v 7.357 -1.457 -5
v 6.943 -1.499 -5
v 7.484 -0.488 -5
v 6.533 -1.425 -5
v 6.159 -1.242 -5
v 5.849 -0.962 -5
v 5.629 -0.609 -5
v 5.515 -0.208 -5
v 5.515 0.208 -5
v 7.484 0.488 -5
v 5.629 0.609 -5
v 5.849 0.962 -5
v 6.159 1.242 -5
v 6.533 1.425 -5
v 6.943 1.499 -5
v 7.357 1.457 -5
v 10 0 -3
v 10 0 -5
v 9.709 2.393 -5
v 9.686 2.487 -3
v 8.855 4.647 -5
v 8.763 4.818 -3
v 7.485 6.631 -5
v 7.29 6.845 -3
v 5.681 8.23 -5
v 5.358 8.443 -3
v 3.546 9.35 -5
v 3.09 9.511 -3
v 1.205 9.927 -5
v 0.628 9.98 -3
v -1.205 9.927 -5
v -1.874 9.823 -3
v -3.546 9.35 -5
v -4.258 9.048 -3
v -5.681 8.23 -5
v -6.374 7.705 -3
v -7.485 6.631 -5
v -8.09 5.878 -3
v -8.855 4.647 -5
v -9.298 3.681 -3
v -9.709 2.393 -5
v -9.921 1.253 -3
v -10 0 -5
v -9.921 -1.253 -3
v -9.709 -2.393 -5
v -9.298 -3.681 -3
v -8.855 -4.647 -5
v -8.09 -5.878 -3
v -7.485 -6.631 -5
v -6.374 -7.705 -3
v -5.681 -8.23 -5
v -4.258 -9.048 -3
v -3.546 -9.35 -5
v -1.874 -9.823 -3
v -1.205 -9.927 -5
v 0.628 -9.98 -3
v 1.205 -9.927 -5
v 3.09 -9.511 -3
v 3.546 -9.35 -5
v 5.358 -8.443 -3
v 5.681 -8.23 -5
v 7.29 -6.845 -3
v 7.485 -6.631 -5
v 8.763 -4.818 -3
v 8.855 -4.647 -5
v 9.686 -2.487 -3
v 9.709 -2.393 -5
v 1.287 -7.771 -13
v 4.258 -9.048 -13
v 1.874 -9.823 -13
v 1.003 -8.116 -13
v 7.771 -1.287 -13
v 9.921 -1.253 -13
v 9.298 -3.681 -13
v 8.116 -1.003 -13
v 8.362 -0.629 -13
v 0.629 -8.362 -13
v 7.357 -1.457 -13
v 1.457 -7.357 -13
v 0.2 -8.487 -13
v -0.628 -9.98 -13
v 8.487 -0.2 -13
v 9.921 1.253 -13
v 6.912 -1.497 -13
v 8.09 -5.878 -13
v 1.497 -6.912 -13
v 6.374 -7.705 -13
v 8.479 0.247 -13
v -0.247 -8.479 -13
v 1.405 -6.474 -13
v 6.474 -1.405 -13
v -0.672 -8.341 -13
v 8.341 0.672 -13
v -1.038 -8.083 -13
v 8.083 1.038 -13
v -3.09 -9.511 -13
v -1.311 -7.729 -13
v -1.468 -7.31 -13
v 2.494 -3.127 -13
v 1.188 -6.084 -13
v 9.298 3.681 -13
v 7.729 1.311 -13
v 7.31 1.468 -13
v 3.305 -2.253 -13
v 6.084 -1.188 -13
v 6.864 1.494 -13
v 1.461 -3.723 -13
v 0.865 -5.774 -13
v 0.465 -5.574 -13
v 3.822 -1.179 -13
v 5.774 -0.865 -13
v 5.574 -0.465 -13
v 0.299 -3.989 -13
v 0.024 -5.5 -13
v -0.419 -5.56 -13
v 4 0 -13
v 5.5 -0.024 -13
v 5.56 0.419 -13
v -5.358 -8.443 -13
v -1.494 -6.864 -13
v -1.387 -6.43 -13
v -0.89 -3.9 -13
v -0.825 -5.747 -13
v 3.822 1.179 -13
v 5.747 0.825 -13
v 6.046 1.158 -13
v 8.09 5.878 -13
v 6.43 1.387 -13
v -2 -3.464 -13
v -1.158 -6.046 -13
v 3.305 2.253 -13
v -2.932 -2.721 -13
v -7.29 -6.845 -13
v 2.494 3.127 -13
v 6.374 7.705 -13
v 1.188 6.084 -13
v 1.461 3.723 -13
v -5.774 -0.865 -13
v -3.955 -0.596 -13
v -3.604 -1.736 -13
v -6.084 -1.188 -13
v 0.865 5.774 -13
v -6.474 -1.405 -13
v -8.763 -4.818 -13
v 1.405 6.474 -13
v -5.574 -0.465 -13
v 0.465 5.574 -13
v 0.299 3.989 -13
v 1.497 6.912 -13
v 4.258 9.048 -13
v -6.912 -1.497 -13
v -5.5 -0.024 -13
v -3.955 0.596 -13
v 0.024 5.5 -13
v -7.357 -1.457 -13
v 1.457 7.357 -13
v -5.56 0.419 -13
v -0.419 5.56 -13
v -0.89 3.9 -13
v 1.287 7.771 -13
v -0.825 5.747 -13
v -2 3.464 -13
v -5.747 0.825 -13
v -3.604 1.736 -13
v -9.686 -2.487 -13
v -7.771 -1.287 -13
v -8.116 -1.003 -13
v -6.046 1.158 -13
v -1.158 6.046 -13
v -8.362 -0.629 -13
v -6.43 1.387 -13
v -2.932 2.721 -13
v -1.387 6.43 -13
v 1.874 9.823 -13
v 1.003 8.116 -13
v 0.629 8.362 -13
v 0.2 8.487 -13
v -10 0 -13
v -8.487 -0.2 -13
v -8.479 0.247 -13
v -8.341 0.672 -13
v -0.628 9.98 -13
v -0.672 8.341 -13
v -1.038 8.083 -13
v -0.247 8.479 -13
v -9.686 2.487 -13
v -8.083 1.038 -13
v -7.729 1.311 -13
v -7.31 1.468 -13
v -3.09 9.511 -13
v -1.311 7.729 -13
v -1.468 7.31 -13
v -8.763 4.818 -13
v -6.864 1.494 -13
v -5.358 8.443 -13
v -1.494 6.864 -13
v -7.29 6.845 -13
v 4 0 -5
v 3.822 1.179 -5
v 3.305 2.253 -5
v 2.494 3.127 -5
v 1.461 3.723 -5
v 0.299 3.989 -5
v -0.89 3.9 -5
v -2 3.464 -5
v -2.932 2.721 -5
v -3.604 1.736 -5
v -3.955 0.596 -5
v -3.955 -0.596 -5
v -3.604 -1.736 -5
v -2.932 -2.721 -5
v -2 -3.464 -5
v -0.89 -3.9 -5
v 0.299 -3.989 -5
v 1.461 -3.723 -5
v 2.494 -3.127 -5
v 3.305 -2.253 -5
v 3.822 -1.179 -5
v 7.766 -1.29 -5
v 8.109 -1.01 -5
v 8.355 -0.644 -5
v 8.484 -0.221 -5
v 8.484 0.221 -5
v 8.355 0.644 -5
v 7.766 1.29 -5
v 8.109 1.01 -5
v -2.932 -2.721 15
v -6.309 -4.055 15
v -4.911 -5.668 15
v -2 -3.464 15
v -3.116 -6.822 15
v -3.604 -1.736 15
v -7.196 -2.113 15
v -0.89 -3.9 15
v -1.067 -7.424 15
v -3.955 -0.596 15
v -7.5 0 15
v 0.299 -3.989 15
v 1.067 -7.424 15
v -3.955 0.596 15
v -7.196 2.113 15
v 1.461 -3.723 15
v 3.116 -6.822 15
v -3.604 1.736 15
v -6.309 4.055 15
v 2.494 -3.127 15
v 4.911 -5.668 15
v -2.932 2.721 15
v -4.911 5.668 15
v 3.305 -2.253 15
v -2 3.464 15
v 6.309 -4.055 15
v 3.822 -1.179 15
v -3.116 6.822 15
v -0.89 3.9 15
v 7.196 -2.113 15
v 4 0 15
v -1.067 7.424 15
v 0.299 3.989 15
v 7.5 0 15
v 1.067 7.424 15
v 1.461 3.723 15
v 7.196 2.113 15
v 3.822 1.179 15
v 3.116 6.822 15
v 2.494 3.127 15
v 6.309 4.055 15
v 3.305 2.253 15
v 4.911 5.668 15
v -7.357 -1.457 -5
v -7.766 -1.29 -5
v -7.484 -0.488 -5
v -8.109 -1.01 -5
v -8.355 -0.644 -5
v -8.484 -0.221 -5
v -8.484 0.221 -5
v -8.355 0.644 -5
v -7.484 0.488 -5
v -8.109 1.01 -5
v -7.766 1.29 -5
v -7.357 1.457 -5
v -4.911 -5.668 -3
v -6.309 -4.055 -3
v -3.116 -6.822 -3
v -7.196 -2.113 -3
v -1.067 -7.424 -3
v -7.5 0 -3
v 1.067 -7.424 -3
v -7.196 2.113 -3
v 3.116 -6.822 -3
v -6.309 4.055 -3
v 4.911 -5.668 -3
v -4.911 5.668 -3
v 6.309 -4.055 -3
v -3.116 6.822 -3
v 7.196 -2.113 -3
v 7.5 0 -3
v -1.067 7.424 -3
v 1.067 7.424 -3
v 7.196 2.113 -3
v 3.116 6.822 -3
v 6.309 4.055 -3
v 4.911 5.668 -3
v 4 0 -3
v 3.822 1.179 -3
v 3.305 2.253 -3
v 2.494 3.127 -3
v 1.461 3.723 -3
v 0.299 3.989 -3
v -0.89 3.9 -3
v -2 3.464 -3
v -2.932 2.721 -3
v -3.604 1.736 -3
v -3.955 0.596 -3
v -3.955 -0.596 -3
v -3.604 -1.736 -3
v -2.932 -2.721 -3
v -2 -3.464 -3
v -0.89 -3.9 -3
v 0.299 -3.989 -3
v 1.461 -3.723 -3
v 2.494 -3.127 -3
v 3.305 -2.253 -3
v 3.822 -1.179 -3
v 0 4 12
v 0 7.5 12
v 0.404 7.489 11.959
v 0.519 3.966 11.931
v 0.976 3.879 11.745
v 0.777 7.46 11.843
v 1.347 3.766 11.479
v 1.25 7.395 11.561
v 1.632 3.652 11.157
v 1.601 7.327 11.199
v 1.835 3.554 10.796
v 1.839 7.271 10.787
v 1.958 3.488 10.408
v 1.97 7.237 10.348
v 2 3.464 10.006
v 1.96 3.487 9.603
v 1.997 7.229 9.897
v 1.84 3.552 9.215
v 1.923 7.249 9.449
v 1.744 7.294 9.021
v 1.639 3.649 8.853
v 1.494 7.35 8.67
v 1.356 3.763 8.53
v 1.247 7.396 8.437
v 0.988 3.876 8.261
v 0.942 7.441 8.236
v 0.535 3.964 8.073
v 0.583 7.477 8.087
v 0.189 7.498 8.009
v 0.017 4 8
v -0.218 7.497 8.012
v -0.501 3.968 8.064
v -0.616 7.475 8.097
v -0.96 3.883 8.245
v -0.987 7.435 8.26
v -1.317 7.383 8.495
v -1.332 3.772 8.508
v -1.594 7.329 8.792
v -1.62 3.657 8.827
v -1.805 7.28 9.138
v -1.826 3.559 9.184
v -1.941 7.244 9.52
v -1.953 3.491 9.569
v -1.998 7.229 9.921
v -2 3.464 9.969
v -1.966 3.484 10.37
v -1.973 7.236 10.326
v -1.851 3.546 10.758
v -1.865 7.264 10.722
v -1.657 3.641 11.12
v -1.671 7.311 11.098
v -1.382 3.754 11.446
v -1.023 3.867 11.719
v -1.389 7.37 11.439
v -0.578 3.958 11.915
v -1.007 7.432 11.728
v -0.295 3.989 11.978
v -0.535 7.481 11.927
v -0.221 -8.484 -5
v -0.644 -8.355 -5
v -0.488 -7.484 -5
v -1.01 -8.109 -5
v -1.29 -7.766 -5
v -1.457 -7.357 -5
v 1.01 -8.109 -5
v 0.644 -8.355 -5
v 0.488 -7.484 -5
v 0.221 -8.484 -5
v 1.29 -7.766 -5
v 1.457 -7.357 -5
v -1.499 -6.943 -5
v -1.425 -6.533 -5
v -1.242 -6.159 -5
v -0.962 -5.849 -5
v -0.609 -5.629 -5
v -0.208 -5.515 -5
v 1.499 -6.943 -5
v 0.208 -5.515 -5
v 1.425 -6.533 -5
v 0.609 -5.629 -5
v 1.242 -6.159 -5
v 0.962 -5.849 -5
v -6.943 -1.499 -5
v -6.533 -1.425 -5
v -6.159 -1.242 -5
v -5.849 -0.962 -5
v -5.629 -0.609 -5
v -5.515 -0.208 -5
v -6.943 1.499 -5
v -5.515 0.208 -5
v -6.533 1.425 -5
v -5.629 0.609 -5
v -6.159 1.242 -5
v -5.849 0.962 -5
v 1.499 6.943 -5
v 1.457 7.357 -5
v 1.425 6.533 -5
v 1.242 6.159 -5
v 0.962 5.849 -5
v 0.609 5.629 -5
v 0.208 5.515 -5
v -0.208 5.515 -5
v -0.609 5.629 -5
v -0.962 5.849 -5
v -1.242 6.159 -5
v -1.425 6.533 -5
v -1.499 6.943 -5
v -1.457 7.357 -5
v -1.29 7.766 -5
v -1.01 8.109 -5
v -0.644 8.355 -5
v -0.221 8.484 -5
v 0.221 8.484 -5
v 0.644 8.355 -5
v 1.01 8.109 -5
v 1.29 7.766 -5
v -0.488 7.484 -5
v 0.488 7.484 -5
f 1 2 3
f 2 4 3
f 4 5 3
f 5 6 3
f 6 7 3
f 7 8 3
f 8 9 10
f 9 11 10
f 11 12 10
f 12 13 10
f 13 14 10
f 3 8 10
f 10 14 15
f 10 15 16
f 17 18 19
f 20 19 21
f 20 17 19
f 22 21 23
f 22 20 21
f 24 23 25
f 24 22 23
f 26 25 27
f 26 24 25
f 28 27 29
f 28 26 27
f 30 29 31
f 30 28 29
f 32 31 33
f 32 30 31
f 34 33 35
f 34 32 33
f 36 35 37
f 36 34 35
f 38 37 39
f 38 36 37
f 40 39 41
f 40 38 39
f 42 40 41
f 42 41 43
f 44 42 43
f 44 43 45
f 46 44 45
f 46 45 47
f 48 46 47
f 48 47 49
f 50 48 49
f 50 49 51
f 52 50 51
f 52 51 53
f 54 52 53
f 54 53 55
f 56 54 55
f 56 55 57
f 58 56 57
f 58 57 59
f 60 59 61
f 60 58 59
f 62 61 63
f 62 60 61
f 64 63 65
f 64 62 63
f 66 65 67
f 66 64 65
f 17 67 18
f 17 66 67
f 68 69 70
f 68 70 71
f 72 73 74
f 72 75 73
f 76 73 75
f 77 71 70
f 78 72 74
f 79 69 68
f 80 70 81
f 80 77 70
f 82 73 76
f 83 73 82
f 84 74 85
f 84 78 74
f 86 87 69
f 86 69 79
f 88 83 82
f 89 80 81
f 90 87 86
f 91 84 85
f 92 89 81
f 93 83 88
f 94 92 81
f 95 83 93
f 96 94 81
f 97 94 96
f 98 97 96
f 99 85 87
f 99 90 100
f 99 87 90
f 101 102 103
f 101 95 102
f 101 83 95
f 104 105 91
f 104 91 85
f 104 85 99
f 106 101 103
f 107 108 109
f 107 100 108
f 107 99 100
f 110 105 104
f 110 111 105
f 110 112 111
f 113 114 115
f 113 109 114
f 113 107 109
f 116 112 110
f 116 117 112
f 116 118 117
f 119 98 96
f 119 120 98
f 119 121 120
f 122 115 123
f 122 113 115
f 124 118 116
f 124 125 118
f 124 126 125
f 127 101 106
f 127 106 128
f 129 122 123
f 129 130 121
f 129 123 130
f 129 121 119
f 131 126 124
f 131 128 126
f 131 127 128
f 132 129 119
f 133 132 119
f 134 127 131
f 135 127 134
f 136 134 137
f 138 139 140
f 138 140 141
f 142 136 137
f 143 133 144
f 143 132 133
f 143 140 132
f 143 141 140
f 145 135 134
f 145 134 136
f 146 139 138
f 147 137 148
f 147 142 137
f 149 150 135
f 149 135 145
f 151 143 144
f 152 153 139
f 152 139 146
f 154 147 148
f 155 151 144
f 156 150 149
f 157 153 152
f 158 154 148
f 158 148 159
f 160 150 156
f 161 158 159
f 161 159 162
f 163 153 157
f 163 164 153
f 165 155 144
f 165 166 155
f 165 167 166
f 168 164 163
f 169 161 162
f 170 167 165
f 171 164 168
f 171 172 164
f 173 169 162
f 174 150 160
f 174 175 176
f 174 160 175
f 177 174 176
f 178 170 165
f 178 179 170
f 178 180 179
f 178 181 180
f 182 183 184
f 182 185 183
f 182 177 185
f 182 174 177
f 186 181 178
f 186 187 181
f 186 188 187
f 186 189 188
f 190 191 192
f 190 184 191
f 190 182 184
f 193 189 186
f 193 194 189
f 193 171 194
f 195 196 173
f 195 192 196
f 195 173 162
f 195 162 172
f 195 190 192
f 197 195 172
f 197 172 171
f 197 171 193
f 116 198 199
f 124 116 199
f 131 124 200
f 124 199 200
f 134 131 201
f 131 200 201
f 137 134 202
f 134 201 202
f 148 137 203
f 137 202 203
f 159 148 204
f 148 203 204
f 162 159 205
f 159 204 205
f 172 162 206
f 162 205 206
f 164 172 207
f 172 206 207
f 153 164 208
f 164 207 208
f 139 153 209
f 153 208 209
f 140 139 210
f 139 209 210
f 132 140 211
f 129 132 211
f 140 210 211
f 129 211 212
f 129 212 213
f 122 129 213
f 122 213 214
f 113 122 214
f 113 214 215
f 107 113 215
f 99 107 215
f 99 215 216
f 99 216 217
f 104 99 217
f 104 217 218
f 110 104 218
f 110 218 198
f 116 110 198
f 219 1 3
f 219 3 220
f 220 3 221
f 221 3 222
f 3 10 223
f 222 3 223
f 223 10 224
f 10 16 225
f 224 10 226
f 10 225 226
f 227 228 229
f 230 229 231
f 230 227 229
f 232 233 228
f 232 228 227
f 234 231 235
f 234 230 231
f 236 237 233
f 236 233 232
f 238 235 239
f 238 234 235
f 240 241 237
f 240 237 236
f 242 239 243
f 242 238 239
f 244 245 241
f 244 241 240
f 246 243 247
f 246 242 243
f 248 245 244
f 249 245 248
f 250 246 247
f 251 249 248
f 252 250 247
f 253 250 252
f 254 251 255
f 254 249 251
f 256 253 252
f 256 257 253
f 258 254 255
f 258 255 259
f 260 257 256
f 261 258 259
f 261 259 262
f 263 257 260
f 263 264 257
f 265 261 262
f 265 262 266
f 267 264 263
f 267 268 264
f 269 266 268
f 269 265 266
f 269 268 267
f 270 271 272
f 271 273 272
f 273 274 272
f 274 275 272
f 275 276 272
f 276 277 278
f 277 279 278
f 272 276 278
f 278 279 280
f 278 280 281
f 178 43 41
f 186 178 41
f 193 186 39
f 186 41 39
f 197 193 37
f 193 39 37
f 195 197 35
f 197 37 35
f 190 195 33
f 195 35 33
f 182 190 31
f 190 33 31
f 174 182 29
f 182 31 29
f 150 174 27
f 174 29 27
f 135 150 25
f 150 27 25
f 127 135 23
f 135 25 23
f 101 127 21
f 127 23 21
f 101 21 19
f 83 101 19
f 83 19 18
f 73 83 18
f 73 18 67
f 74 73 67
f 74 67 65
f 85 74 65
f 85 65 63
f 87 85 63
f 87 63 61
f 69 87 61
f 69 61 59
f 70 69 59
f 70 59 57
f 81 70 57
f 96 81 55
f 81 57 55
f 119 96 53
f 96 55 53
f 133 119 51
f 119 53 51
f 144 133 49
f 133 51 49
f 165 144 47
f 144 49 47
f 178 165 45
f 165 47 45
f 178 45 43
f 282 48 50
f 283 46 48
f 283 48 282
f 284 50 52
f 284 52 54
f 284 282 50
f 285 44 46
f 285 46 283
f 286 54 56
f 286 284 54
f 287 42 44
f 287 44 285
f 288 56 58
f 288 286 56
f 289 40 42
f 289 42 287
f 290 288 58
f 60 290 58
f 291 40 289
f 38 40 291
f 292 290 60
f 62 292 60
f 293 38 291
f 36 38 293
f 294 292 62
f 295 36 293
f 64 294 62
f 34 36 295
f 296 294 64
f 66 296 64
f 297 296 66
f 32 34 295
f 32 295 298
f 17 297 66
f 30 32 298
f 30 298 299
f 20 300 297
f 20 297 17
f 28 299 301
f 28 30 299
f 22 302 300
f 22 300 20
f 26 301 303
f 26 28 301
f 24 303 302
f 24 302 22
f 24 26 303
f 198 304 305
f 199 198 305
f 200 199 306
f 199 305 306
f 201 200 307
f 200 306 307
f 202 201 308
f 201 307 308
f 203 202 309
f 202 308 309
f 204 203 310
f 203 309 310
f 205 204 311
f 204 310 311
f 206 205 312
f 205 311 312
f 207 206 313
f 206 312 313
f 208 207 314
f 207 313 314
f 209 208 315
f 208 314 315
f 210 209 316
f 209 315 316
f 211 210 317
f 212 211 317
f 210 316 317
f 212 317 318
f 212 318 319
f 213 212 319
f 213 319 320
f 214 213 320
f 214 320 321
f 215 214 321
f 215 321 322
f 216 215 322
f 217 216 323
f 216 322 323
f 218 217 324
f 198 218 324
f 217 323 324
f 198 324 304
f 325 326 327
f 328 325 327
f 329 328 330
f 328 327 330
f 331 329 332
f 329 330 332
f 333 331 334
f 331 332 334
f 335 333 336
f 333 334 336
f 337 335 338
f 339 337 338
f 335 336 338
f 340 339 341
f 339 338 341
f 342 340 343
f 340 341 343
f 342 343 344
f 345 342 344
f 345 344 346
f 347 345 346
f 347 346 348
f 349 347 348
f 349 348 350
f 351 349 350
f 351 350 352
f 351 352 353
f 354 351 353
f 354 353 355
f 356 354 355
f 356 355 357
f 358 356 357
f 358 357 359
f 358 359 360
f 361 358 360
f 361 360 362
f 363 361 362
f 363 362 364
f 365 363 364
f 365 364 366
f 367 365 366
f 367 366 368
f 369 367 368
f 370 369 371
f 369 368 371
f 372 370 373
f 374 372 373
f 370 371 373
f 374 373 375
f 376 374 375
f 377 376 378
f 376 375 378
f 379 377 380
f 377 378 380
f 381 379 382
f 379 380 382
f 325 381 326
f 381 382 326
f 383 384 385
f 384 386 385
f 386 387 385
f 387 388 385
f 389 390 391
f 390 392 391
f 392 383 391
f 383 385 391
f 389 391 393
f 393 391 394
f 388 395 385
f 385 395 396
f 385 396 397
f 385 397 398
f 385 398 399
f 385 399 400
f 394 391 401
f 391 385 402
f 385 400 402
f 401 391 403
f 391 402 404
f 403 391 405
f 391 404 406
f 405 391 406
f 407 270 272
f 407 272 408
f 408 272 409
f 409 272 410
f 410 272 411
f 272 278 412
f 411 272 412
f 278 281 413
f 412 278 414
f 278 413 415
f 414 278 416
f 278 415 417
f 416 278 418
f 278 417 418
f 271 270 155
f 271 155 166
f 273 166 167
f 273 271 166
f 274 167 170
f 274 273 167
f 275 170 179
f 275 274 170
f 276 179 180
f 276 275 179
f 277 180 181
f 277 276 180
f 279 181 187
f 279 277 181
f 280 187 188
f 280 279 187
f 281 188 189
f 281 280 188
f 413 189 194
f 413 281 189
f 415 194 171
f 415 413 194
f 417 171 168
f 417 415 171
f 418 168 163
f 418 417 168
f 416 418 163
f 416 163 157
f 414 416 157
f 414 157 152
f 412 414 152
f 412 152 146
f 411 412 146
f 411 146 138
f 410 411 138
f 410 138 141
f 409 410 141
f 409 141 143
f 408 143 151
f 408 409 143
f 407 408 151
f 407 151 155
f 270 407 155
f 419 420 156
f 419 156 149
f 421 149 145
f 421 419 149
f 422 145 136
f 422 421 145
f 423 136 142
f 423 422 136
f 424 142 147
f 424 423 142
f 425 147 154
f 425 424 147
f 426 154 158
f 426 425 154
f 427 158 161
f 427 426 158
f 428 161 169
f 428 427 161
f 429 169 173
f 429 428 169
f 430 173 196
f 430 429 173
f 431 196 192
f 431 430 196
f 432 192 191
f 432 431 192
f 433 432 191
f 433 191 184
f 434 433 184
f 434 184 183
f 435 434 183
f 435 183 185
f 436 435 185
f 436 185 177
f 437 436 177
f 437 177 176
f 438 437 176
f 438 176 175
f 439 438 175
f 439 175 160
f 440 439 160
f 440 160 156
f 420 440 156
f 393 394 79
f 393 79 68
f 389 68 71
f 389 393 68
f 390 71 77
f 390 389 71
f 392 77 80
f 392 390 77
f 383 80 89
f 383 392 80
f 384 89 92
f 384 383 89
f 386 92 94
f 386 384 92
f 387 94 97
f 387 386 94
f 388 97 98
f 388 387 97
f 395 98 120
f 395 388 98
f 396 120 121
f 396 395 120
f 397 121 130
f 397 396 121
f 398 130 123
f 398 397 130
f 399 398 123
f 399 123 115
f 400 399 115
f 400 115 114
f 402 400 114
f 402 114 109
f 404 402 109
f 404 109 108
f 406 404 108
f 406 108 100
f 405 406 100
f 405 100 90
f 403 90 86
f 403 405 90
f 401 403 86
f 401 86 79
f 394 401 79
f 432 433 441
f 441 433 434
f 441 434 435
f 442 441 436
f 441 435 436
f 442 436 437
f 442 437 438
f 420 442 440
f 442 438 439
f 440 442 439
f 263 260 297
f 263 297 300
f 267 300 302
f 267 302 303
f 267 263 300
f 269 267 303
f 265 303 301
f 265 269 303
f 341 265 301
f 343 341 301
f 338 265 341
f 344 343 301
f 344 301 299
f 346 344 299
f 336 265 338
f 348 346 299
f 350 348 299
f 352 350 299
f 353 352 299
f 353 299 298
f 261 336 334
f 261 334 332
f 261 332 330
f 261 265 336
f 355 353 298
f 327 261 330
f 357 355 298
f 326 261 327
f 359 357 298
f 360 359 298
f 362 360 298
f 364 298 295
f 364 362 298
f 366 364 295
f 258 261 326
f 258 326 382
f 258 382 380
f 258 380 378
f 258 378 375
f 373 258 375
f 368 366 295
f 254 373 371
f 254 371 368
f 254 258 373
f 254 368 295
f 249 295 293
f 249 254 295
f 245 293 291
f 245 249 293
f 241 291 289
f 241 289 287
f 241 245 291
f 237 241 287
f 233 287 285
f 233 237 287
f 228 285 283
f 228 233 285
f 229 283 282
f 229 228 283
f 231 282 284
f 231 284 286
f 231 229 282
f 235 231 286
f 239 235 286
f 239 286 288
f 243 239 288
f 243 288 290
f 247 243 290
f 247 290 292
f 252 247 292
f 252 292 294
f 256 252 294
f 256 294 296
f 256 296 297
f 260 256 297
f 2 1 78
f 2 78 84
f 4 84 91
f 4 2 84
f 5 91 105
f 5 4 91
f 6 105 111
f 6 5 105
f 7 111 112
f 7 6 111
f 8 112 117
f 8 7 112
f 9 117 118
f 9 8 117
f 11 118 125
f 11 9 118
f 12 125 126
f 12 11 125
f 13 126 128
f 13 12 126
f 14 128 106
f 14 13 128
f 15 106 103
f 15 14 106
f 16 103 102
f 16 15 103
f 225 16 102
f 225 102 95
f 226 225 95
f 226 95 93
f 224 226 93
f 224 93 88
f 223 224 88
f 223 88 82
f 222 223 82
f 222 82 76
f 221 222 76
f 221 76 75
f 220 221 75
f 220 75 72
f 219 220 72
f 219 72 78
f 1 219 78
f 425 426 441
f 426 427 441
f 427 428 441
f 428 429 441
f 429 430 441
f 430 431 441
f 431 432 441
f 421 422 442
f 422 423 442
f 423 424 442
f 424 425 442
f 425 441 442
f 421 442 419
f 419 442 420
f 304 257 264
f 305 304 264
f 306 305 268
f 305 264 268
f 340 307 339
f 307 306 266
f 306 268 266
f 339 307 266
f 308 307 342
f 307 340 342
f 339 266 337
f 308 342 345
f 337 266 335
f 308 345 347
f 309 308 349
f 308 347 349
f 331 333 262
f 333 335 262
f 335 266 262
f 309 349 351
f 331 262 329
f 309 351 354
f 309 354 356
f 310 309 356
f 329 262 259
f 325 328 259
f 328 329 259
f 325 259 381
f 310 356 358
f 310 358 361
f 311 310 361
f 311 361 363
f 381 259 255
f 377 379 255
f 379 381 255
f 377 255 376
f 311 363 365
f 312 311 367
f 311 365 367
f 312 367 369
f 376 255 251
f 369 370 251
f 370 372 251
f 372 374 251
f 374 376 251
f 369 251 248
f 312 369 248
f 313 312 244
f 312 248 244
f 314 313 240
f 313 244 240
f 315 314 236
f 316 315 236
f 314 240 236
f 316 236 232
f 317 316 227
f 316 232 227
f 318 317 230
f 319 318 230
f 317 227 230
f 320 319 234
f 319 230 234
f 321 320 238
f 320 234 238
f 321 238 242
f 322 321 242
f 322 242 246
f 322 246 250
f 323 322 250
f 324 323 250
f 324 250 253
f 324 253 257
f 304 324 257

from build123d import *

# Parameters (mm, degrees)
SKETCH1_R           = 7.5
SKETCH1_R_2         = 4
BOSS_EXTRUDE1_DEPTH = 5
SKETCH3_R           = 10
SKETCH3_R_2         = 1.5
BOSS_EXTRUDE3_DEPTH = 8
BOSS_EXTRUDE4_START = 15
SKETCH4_R           = 7.5
SKETCH4_R_2         = 4
BOSS_EXTRUDE4_DEPTH = 15
SKETCH2_R           = 2
CUT_EXTRUDE1_DEPTH  = 7
SKETCH6_R           = 4
CUT_EXTRUDE2_DEPTH  = 32.368774283
BOSS_EXTRUDE5_START = 2
SKETCH7_R           = 10
SKETCH7_R_2         = 4
BOSS_EXTRUDE5_DEPTH = 2


with BuildPart() as part:
    # Sketch1 → Boss-Extrude1 (new body)
    # profile 1 of 2: a face of its own
    with BuildSketch(Plane.XY):
        Circle(SKETCH1_R)
        Circle(SKETCH1_R_2, mode=Mode.SUBTRACT)
    # profile 2 of 2: a face of its own
    with BuildSketch(Plane.XY):
        Circle(SKETCH1_R_2)
    extrude(amount=-BOSS_EXTRUDE1_DEPTH)

    # Sketch3 → Boss-Extrude3 (add)
    with BuildSketch(Plane(origin=(0, 0, -5), x_dir=(-1, 0, 0), z_dir=(0, 0, -1))):
        Circle(SKETCH3_R)
        with Locations(Location((0, 7, 0), (0, 0, 166.225853002))):
            Circle(SKETCH3_R_2, mode=Mode.SUBTRACT)
        with Locations(Location((7, 0, 0), (0, 0, 283.774146998))):
            Circle(SKETCH3_R_2, mode=Mode.SUBTRACT)
        with Locations(Location((0, -7, 0), (0, 0, 193.774146998))):
            Circle(SKETCH3_R_2, mode=Mode.SUBTRACT)
        with Locations(Location((-7, 0, 0), (0, 0, 256.225853002))):
            Circle(SKETCH3_R_2, mode=Mode.SUBTRACT)
    extrude(amount=BOSS_EXTRUDE3_DEPTH)

    # Sketch4 → Boss-Extrude4 (add)
    with BuildSketch(Plane.XY.offset(BOSS_EXTRUDE4_START)):
        Circle(SKETCH4_R)
        Circle(SKETCH4_R_2, mode=Mode.SUBTRACT)
    extrude(amount=-BOSS_EXTRUDE4_DEPTH)

    # Sketch2 → Cut-Extrude1 (cut)
    with BuildSketch(Plane(origin=(0, 7.5, 0), x_dir=(1, 0, 0), z_dir=(0, 1, 0))):
        with Locations(Location((0, -10, 0), (0, 0, 270))):
            Circle(SKETCH2_R)
    extrude(amount=-CUT_EXTRUDE1_DEPTH, mode=Mode.SUBTRACT)

    # Sketch6 → Cut-Extrude2 (cut, through all)
    with BuildSketch(Plane.XY.offset(15)):
        Circle(SKETCH6_R)
    extrude(amount=-CUT_EXTRUDE2_DEPTH, mode=Mode.SUBTRACT)

    # Sketch7 → Boss-Extrude5 (add)
    with BuildSketch(Plane.XY.offset(-5).offset(BOSS_EXTRUDE5_START)):
        Circle(SKETCH7_R)
        Circle(SKETCH7_R_2, mode=Mode.SUBTRACT)
    extrude(amount=-BOSS_EXTRUDE5_DEPTH)


solid = part.part
